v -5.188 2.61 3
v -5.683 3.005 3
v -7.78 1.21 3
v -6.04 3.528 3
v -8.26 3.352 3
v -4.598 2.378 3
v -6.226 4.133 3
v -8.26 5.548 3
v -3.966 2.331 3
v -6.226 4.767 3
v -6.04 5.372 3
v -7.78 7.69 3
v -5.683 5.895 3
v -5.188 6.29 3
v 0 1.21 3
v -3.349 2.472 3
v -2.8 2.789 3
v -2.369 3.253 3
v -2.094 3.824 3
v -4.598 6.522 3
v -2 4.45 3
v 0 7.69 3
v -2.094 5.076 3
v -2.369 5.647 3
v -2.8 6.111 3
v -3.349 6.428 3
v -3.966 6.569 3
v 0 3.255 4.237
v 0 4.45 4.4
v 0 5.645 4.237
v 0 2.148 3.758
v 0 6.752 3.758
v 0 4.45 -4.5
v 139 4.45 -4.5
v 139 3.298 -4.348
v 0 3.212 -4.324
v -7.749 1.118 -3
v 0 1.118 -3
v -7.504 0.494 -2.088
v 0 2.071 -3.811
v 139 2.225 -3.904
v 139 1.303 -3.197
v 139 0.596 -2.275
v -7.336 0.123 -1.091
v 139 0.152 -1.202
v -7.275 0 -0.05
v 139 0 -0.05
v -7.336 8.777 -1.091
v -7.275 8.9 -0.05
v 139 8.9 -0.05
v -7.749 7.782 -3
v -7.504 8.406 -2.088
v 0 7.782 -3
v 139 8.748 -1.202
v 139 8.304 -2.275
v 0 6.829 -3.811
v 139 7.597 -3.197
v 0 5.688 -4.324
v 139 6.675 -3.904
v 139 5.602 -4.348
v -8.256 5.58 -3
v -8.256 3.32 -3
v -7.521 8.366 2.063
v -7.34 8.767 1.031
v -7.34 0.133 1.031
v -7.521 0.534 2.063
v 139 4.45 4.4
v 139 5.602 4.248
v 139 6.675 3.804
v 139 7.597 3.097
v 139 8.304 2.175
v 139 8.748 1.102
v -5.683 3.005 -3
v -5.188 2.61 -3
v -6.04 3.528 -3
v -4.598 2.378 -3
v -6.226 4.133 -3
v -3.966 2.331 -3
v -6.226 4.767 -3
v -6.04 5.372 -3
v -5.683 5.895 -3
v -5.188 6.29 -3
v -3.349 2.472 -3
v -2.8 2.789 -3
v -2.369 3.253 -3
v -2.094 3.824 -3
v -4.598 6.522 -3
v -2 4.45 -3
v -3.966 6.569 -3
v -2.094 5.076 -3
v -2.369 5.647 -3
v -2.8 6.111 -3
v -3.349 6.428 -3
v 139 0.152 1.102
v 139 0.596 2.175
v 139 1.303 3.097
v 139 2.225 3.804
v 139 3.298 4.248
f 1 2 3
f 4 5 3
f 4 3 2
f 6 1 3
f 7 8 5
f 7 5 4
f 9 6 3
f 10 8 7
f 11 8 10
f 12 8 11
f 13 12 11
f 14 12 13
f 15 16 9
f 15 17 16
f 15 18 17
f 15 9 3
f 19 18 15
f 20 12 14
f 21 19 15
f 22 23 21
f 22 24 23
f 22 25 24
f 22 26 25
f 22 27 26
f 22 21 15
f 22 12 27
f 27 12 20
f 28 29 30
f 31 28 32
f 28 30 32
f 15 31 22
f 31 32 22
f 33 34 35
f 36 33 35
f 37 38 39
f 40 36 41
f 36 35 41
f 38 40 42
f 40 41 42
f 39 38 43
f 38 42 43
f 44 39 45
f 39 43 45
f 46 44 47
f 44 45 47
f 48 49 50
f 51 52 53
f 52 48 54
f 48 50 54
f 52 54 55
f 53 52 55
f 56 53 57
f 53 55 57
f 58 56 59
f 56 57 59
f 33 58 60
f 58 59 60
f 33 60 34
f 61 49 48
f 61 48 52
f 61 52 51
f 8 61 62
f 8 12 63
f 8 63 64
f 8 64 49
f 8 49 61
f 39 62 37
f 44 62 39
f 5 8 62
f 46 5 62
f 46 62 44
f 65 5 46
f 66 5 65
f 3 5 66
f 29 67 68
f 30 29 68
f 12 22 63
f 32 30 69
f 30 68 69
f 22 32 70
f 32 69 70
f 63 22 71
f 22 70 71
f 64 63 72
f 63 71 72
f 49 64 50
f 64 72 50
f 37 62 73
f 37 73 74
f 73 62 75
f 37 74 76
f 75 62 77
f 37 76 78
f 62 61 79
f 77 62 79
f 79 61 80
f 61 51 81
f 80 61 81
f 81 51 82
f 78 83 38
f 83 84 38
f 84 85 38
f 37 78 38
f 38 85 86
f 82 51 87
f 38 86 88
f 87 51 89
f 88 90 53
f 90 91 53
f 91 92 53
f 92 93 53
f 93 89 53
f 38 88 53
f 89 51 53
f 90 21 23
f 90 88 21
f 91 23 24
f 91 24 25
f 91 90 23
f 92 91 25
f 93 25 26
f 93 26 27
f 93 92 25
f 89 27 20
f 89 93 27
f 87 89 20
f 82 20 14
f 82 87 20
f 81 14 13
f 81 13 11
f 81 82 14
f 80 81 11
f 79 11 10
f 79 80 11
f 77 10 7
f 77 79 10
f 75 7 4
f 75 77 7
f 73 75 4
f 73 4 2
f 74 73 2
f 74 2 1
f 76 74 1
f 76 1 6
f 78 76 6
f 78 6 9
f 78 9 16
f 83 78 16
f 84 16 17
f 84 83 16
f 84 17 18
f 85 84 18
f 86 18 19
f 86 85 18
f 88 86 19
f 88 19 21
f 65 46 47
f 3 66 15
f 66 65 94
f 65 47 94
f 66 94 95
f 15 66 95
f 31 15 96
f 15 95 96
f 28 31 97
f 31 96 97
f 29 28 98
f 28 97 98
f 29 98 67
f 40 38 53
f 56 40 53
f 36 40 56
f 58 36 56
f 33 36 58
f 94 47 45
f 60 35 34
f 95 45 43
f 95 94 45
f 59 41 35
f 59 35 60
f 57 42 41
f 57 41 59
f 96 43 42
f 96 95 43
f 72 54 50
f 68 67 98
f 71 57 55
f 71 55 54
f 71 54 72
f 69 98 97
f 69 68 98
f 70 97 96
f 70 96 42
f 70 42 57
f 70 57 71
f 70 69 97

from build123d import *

# Parameters (mm, degrees)
BOSS_EXTRUDE1_DEPTH = 4.5
SKETCH1_3_R         = 2.125
BOSS_EXTRUDE2_DEPTH = 3
CUT_EXTRUDE1_DEPTH  = 200
CUT_EXTRUDE4_DEPTH  = 200
CUT_EXTRUDE5_DEPTH  = 200
CUT_EXTRUDE6_DEPTH  = 200
CUT_EXTRUDE8_DEPTH  = 361


with BuildPart() as part:
    # Sketch1 → Boss-Extrude1 (new, symmetric)
    with BuildSketch(Plane.XY):
        Polygon((139, 8.9), (0, 8.9), (0, 4.45), (0, 0), (139, 0), align=None)
    extrude(amount=BOSS_EXTRUDE1_DEPTH, both=True)

    # Sketch1<3> → Boss-Extrude2 (add, symmetric)
    with BuildSketch(Plane.XY):
        with BuildLine():
            Line((0, 4.45), (0, 8.9))
            Line((0, 8.9), (0, 9.4))
            Line((0, 9.4), (-7.008929738, 9.4))
            ThreePointArc((-7.008929738, 9.4), (-8.32, 4.45), (-7.008929738, -0.5))
            Line((-7.008929738, -0.5), (0, -0.5))
            Line((0, -0.5), (0, 0))
            Line((0, 0), (0, 4.45))
        make_face()
        with Locations((-4.125, 4.45)):
            Circle(SKETCH1_3_R, mode=Mode.SUBTRACT)
    extrude(amount=BOSS_EXTRUDE2_DEPTH, both=True)

    # Sketch2 → Cut-Extrude1 (cut, symmetric)
    with BuildSketch(Plane(origin=(139, 0, 0), x_dir=(0, 0, -1), z_dir=(1, 0, 0))):
        with BuildLine():
            ThreePointArc((0.05, 8.9), (3.196625176, 7.596625176), (4.5, 4.45))
            Line((4.5, 4.45), (4.5, 8.9))
            Line((4.5, 8.9), (0.05, 8.9))
        make_face()
        with BuildLine():
            Line((4.5, 0), (4.5, 4.45))
            ThreePointArc((4.5, 4.45), (3.196625176, 1.303374824), (0.05, 0))
            Line((0.05, 0), (4.5, 0))
        make_face()
        with BuildLine():
            Line((-4.5, 0), (0.05, 0))
            ThreePointArc((0.05, 0), (-3.096625176, 1.303374824), (-4.4, 4.45))
            Line((-4.4, 4.45), (-4.5, 0))
        make_face()
        with BuildLine():
            ThreePointArc((-4.4, 4.45), (-3.096625176, 7.596625176), (0.05, 8.9))
            Line((0.05, 8.9), (-4.4, 8.9))
            Line((-4.4, 8.9), (-4.4, 4.45))
        make_face()
    extrude(amount=CUT_EXTRUDE1_DEPTH, both=True, mode=Mode.SUBTRACT)


with BuildPart() as cut_extrude1_piece_1:
    # of the separate pieces the step leaves, piece 1, a body of its own (cut_extrude1_pieces)
    add(part.part.solids().sort_by_distance((139, 8.9, -0.05))[0])


with BuildPart() as cut_extrude1_piece_2:
    # of the separate pieces the step leaves, piece 2, a body of its own (cut_extrude1_pieces)
    add(part.part.solids().sort_by_distance((139, 8.9, 4.5))[0])

    # Sketch8 → Cut-Extrude8 (cut, symmetric)
    with BuildSketch(Plane(origin=(139, 0, 0), x_dir=(0, 0, -1), z_dir=(1, 0, 0))):
        Polygon((-4.4, 4.45), (-4.497226285, 0.123430317), (-4.497226285, -0.993132251), (-5.525689044, -1.409682141), (-10.667797883, 2.280439271), (-5.525689044, 10.659843857), (-2.697341369, 11.337001628), (-4.4, 7.708140942), align=None)
    extrude(amount=CUT_EXTRUDE8_DEPTH, both=True, mode=Mode.SUBTRACT)


with BuildPart() as cut_extrude1_piece_3:
    # of the separate pieces the step leaves, piece 3, a body of its own (cut_extrude1_pieces)
    add(part.part.solids().sort_by_distance((0, 0, 3))[0])

    # Sketch6 → Cut-Extrude5 (cut, symmetric)
    with BuildSketch(Plane.XY.offset(3)):
        Polygon((0, 0), (0.715891122, -1.192951857), (-7.933711104, -1.400818057), (-7.27530569, 0), align=None)
    extrude(amount=CUT_EXTRUDE5_DEPTH, both=True, mode=Mode.SUBTRACT)


with BuildPart() as cut_extrude1_piece_4:
    # of the separate pieces the step leaves, piece 4, a body of its own (cut_extrude1_pieces)
    add(part.part.solids().sort_by_distance((0, 8.9, -3))[0])

    # Sketch5 → Cut-Extrude4 (cut, symmetric)
    with BuildSketch(Plane(origin=(0, 0, -3), x_dir=(-1, 0, 0), z_dir=(0, 0, -1))):
        Polygon((7.27530569, 8.9), (0, 8.9), (-1.536483872, 9.442626596), (6.771268728, 9.782768914), align=None)
    extrude(amount=CUT_EXTRUDE4_DEPTH, both=True, mode=Mode.SUBTRACT)

    # Sketch7 → Cut-Extrude6 (cut, symmetric)
    with BuildSketch(Plane.XY.offset(3)):
        Polygon((-7.27530569, 8.9), (-6.80653665, 9.625984501), (-7.207484275, 9.625984501), align=None)
    extrude(amount=CUT_EXTRUDE6_DEPTH, both=True, mode=Mode.SUBTRACT)


solid = cut_extrude1_piece_1.part
